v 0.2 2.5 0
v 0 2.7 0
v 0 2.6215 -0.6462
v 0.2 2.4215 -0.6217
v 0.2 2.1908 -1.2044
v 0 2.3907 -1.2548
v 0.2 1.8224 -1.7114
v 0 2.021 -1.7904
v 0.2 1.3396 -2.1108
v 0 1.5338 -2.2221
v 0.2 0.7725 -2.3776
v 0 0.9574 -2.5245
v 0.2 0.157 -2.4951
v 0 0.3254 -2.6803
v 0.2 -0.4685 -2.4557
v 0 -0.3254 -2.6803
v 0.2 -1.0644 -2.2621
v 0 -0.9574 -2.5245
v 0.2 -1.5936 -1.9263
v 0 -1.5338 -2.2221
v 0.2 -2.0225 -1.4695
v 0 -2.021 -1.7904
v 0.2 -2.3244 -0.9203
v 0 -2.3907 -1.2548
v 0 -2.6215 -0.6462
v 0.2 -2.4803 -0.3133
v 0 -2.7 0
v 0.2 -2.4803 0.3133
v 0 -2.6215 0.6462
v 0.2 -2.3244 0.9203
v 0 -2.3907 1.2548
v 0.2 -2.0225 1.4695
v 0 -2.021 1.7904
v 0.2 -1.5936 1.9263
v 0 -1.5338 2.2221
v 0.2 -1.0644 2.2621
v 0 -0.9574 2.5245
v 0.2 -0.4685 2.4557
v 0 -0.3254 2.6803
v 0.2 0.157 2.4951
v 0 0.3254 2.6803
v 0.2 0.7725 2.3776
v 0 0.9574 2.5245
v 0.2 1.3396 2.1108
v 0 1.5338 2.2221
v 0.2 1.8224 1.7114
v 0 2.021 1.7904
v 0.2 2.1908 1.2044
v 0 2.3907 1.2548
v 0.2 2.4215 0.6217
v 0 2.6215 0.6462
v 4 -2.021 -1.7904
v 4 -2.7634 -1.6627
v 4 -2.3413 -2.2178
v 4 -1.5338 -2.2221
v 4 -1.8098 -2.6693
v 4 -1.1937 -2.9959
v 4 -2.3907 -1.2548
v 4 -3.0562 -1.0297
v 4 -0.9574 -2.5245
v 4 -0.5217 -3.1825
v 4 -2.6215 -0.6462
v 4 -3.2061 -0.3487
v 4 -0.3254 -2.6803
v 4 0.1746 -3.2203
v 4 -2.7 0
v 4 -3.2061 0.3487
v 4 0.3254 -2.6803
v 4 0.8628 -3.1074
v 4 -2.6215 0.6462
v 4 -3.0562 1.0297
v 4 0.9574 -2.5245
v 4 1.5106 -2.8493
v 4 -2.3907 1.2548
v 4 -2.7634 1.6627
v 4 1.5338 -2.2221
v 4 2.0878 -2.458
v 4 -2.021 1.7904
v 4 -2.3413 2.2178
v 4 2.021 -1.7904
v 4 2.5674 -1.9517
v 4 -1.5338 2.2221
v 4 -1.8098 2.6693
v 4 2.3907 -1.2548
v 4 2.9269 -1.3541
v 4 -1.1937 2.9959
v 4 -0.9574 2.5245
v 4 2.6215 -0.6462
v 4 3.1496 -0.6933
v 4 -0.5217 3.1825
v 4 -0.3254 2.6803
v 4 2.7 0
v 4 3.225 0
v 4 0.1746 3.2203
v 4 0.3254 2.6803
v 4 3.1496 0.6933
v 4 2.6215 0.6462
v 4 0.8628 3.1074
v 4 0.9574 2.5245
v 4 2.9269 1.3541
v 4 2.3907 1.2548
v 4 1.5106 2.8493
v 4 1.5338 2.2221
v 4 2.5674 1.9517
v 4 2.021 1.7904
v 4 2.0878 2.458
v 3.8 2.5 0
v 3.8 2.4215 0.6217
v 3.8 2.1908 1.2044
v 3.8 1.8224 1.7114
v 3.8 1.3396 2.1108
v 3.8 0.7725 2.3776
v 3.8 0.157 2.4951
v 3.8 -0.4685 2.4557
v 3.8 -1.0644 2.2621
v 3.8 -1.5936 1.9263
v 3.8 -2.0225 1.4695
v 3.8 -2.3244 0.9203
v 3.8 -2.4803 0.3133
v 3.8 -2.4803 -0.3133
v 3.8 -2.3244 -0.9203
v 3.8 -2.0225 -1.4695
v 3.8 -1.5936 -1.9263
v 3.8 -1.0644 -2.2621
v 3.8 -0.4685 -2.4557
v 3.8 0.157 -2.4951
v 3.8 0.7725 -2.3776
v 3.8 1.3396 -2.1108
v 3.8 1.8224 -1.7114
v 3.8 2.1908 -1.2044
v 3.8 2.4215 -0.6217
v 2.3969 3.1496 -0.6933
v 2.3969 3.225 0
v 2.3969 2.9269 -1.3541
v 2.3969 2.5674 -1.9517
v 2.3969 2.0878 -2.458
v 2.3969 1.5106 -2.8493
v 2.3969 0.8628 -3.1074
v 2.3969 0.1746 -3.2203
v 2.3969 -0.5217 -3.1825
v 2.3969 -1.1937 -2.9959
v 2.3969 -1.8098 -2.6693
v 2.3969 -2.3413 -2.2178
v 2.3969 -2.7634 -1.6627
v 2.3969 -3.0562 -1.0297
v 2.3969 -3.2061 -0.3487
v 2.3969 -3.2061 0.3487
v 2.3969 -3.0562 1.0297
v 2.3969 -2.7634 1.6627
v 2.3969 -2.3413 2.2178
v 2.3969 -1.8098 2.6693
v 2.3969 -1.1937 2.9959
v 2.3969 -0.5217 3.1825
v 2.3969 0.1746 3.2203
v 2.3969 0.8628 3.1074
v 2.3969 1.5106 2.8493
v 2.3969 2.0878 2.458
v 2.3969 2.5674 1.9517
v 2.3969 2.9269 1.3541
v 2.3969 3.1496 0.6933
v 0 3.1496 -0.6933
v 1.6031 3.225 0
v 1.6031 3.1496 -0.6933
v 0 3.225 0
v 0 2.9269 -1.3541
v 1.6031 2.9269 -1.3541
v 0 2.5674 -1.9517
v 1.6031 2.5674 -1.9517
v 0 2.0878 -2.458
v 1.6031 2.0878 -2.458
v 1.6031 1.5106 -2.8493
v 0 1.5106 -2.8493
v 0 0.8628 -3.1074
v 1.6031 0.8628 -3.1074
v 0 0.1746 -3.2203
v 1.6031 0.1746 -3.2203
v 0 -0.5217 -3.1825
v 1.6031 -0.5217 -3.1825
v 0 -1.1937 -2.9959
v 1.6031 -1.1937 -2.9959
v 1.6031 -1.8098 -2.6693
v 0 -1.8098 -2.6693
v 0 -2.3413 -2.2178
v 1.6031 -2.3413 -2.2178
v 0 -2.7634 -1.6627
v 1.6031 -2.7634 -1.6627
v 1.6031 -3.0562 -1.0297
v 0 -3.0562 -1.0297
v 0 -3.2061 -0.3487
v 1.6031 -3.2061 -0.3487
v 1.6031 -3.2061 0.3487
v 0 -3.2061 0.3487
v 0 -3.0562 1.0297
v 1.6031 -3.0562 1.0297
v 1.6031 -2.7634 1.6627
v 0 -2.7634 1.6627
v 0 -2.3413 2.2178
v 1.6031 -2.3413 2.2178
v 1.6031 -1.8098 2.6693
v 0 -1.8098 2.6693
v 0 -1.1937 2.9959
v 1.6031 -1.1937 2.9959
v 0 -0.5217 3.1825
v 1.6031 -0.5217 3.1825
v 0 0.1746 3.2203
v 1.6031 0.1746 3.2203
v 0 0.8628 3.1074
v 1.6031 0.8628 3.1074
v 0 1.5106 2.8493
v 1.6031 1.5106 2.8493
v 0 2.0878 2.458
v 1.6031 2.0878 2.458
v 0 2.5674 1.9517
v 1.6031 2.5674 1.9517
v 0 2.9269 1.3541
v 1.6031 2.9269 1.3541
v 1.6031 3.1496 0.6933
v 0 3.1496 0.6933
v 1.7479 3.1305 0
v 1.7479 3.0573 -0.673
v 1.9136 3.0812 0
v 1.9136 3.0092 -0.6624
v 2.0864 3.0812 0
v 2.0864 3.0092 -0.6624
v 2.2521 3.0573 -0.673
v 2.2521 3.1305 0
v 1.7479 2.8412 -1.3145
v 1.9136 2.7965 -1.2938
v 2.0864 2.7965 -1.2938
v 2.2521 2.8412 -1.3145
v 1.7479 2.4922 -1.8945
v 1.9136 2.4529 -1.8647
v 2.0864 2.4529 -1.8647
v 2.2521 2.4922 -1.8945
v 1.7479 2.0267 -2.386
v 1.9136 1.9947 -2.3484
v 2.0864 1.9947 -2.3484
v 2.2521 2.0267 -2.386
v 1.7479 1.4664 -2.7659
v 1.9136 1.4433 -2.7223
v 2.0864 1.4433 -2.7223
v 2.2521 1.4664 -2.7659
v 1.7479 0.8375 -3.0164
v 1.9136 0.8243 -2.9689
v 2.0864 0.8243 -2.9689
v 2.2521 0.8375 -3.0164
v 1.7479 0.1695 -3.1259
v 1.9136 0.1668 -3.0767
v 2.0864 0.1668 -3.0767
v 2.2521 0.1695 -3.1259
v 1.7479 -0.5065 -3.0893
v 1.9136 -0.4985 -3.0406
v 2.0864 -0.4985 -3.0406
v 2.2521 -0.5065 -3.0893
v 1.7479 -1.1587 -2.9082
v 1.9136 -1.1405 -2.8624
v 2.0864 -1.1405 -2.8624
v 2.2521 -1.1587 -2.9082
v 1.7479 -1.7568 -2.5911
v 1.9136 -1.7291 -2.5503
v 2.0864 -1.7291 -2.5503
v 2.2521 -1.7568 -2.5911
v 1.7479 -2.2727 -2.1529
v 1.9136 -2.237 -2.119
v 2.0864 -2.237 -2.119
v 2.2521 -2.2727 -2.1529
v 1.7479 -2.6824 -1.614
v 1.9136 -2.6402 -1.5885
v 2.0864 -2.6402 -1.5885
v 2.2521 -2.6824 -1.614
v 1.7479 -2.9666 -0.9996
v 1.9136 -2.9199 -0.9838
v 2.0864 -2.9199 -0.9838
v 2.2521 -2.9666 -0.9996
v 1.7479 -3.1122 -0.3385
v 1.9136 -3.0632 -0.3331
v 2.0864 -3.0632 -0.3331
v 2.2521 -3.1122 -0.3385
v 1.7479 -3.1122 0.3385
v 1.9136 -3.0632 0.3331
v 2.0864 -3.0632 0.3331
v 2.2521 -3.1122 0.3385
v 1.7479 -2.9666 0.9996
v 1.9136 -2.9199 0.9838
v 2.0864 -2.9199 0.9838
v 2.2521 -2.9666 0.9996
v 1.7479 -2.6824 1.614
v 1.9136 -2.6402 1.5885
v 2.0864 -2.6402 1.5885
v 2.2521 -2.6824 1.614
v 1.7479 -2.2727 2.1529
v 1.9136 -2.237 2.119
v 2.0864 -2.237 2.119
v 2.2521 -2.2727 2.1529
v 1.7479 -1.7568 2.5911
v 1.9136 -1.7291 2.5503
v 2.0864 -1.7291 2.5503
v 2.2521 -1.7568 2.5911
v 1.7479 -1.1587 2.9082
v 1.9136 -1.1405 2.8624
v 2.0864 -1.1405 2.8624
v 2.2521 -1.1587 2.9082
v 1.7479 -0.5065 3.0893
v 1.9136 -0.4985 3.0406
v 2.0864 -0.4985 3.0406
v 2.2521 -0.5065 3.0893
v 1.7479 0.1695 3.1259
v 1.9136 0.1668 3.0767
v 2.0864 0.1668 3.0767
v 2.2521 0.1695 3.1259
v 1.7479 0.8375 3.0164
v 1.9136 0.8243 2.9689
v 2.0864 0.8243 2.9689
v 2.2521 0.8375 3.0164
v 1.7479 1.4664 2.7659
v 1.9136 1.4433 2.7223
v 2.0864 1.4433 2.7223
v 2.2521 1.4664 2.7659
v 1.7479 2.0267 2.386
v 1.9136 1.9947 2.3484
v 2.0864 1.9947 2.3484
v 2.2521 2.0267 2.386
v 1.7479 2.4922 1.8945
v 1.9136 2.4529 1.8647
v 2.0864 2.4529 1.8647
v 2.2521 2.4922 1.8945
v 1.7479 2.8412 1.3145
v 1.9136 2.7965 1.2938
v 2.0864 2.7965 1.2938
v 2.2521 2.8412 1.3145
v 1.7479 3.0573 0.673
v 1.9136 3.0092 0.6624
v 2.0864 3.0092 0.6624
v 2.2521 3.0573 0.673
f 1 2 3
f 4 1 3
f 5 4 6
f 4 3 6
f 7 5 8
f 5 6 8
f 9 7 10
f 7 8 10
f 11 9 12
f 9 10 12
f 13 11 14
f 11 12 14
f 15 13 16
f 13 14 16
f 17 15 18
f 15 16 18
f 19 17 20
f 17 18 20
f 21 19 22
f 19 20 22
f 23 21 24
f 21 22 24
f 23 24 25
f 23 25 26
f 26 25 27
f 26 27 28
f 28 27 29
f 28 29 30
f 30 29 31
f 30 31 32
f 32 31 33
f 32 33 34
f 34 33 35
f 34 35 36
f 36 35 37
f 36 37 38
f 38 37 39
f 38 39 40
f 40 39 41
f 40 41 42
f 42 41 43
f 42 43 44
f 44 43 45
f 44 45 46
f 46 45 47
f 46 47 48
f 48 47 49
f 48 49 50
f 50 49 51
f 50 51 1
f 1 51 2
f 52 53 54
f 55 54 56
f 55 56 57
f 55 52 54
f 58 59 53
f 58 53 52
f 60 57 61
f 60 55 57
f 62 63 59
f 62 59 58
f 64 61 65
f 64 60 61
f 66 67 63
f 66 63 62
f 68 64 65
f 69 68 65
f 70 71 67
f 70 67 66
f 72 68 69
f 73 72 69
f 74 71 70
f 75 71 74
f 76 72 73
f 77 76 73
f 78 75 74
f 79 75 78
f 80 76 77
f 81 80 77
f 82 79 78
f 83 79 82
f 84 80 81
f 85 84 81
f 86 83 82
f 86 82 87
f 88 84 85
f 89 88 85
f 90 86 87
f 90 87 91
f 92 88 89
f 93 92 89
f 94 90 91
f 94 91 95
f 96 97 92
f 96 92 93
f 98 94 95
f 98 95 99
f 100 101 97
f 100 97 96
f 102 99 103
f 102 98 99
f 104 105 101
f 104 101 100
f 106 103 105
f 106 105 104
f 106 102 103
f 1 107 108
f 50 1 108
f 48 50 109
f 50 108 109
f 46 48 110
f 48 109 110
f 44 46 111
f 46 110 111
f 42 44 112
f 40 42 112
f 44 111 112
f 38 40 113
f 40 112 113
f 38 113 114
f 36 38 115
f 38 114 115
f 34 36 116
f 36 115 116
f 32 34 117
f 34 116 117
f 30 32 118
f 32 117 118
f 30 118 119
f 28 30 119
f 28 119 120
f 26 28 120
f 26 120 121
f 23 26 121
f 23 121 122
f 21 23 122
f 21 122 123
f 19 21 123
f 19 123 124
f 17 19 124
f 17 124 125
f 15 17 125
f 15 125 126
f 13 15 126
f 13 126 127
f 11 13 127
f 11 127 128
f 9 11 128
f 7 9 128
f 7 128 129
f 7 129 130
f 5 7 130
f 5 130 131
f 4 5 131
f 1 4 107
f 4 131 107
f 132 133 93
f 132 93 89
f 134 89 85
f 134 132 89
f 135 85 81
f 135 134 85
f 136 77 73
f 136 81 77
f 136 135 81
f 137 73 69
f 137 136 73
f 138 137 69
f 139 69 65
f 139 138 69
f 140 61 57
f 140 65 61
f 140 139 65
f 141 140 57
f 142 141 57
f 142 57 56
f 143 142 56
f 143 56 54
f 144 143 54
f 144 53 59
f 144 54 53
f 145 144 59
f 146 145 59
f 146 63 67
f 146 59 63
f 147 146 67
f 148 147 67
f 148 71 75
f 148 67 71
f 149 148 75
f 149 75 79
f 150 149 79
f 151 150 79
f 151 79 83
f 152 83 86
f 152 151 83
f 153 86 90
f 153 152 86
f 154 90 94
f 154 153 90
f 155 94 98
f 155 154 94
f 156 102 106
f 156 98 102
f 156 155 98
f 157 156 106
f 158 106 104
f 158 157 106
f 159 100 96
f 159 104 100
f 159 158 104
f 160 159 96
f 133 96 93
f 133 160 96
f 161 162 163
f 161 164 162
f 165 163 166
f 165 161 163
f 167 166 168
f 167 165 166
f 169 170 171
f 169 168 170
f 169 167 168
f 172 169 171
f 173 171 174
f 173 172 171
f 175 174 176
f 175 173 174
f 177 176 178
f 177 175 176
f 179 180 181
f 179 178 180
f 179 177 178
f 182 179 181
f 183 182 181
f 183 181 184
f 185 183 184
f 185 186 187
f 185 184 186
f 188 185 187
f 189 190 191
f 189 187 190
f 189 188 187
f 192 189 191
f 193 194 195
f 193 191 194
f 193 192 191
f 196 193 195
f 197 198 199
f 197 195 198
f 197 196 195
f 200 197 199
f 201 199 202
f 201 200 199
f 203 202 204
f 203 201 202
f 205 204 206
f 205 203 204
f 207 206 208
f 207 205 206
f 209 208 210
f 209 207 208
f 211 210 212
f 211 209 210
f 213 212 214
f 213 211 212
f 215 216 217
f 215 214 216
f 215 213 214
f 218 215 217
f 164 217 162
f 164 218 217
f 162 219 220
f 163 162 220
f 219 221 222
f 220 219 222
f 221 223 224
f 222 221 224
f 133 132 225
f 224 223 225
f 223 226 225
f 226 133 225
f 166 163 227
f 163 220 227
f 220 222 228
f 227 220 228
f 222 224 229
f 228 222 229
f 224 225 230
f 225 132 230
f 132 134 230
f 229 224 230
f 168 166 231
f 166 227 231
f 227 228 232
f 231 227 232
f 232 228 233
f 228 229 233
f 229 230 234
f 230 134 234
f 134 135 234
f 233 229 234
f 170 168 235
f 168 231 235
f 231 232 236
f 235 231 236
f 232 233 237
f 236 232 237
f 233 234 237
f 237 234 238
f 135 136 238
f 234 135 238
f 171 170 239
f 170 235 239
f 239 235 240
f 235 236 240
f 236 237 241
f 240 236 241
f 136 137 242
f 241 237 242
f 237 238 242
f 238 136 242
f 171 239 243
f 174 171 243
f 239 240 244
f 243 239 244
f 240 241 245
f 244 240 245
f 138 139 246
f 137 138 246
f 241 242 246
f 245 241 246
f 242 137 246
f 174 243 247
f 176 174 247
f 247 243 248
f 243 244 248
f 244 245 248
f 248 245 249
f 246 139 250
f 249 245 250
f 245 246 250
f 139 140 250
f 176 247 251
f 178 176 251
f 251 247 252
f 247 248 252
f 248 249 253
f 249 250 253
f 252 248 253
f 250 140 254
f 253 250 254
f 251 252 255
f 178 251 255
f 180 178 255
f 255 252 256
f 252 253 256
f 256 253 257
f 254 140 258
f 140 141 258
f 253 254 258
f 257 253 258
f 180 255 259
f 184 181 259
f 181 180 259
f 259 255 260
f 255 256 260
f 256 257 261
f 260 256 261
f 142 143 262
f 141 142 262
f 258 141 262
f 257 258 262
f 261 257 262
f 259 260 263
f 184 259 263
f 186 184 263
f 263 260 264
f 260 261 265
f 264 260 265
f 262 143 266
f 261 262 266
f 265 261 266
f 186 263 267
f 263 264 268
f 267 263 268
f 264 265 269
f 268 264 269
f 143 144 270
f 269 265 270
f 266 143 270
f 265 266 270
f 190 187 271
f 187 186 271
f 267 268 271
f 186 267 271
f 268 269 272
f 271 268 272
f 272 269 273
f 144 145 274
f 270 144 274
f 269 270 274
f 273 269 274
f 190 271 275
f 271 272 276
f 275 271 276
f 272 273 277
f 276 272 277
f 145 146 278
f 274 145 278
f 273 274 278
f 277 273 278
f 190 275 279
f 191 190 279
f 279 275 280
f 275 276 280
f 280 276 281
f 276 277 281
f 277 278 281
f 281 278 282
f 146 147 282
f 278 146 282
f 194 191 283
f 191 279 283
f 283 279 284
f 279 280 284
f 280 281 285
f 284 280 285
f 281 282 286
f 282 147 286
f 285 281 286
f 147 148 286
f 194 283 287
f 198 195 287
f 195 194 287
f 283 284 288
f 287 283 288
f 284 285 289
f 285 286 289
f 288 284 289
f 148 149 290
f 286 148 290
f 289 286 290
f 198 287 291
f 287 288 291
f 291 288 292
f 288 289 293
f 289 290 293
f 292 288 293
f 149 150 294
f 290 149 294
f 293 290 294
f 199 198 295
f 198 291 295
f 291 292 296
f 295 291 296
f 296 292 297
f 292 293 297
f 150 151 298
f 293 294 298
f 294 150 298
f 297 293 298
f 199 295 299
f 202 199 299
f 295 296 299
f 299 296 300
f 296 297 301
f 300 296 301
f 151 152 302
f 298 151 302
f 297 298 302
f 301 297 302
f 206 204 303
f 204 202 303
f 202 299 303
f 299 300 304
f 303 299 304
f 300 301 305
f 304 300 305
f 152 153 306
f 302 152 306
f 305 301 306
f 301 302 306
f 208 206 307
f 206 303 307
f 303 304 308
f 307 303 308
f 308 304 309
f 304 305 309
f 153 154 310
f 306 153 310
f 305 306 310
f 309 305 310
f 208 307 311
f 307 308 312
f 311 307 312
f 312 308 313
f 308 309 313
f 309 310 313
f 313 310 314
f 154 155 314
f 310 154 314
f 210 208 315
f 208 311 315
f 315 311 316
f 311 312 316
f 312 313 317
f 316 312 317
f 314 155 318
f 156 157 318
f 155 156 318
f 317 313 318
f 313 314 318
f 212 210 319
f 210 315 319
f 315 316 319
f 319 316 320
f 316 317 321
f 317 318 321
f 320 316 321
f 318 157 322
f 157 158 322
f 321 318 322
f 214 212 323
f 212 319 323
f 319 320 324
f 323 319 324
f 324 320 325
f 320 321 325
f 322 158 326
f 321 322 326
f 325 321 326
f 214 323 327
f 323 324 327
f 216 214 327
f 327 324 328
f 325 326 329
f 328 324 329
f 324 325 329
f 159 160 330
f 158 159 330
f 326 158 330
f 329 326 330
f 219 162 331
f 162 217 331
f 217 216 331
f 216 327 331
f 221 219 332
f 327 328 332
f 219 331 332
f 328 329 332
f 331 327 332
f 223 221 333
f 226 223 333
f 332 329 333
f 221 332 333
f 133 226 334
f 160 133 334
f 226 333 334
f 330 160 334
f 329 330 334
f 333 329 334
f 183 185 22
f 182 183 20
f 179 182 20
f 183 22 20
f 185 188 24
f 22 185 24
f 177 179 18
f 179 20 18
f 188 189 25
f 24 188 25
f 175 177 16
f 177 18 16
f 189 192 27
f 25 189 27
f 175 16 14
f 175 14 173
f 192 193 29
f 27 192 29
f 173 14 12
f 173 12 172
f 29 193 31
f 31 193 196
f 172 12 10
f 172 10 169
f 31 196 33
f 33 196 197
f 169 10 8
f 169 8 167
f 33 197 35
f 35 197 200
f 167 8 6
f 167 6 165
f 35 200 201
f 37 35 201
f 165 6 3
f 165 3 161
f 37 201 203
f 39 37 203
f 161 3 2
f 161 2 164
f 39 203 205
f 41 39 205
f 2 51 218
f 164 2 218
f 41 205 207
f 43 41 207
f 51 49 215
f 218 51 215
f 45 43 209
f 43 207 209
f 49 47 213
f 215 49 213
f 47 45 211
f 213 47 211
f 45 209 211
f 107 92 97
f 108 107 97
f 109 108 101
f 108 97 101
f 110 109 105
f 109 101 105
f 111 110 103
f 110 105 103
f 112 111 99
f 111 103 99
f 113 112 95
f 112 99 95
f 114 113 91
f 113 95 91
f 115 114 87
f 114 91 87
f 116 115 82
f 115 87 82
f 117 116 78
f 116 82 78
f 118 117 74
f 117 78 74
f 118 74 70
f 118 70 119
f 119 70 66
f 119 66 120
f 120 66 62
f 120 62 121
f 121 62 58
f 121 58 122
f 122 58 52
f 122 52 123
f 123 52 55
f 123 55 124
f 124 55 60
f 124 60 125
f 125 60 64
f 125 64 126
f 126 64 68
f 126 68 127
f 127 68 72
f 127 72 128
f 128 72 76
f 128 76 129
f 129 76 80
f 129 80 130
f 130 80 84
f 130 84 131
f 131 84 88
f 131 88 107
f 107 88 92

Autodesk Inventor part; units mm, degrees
sketch "Sketch_2" plane through (0, 0, 0) normal (0, 0, 1) x (1, 0, 0)
  line L0 (4, 0) -> (0, 0)
  line L1 (0, 3.225) -> (0, 2.7)
  line L2 (0, 2.7) -> (0.2, 2.5)
  line L3 (0.2, 2.5) -> (3.8, 2.5)
  line L4 (3.8, 2.5) -> (4, 2.7)
  line L5 (4, 2.7) -> (4, 3.225)
  line L6 (4, 3.225) -> (2.3969, 3.225)
  arc A0 (1.6031, 3.225) -> (2.3969, 3.225) centre (2, 3.675) ccw
  line L7 (1.6031, 3.225) -> (0, 3.225)
revolve "Revolution1" add sketch "Sketch_2" angle 360 about axis through (4, 0, 0) along (1, 0, 0)
ref_plane "center_or_XY" through (0, 0, 0) normal (1, 0, 0) x (0, 0, -1)
ref_plane "center_or_YZ" through (0, 0, 0) normal (0, 0, -1) x (0, 1, 0)
ref_plane "center_or_ZX" through (0, 0, 0) normal (0, 1, 0) x (1, 0, 0)
properties part number "WML5010ZZ Inner ring"
